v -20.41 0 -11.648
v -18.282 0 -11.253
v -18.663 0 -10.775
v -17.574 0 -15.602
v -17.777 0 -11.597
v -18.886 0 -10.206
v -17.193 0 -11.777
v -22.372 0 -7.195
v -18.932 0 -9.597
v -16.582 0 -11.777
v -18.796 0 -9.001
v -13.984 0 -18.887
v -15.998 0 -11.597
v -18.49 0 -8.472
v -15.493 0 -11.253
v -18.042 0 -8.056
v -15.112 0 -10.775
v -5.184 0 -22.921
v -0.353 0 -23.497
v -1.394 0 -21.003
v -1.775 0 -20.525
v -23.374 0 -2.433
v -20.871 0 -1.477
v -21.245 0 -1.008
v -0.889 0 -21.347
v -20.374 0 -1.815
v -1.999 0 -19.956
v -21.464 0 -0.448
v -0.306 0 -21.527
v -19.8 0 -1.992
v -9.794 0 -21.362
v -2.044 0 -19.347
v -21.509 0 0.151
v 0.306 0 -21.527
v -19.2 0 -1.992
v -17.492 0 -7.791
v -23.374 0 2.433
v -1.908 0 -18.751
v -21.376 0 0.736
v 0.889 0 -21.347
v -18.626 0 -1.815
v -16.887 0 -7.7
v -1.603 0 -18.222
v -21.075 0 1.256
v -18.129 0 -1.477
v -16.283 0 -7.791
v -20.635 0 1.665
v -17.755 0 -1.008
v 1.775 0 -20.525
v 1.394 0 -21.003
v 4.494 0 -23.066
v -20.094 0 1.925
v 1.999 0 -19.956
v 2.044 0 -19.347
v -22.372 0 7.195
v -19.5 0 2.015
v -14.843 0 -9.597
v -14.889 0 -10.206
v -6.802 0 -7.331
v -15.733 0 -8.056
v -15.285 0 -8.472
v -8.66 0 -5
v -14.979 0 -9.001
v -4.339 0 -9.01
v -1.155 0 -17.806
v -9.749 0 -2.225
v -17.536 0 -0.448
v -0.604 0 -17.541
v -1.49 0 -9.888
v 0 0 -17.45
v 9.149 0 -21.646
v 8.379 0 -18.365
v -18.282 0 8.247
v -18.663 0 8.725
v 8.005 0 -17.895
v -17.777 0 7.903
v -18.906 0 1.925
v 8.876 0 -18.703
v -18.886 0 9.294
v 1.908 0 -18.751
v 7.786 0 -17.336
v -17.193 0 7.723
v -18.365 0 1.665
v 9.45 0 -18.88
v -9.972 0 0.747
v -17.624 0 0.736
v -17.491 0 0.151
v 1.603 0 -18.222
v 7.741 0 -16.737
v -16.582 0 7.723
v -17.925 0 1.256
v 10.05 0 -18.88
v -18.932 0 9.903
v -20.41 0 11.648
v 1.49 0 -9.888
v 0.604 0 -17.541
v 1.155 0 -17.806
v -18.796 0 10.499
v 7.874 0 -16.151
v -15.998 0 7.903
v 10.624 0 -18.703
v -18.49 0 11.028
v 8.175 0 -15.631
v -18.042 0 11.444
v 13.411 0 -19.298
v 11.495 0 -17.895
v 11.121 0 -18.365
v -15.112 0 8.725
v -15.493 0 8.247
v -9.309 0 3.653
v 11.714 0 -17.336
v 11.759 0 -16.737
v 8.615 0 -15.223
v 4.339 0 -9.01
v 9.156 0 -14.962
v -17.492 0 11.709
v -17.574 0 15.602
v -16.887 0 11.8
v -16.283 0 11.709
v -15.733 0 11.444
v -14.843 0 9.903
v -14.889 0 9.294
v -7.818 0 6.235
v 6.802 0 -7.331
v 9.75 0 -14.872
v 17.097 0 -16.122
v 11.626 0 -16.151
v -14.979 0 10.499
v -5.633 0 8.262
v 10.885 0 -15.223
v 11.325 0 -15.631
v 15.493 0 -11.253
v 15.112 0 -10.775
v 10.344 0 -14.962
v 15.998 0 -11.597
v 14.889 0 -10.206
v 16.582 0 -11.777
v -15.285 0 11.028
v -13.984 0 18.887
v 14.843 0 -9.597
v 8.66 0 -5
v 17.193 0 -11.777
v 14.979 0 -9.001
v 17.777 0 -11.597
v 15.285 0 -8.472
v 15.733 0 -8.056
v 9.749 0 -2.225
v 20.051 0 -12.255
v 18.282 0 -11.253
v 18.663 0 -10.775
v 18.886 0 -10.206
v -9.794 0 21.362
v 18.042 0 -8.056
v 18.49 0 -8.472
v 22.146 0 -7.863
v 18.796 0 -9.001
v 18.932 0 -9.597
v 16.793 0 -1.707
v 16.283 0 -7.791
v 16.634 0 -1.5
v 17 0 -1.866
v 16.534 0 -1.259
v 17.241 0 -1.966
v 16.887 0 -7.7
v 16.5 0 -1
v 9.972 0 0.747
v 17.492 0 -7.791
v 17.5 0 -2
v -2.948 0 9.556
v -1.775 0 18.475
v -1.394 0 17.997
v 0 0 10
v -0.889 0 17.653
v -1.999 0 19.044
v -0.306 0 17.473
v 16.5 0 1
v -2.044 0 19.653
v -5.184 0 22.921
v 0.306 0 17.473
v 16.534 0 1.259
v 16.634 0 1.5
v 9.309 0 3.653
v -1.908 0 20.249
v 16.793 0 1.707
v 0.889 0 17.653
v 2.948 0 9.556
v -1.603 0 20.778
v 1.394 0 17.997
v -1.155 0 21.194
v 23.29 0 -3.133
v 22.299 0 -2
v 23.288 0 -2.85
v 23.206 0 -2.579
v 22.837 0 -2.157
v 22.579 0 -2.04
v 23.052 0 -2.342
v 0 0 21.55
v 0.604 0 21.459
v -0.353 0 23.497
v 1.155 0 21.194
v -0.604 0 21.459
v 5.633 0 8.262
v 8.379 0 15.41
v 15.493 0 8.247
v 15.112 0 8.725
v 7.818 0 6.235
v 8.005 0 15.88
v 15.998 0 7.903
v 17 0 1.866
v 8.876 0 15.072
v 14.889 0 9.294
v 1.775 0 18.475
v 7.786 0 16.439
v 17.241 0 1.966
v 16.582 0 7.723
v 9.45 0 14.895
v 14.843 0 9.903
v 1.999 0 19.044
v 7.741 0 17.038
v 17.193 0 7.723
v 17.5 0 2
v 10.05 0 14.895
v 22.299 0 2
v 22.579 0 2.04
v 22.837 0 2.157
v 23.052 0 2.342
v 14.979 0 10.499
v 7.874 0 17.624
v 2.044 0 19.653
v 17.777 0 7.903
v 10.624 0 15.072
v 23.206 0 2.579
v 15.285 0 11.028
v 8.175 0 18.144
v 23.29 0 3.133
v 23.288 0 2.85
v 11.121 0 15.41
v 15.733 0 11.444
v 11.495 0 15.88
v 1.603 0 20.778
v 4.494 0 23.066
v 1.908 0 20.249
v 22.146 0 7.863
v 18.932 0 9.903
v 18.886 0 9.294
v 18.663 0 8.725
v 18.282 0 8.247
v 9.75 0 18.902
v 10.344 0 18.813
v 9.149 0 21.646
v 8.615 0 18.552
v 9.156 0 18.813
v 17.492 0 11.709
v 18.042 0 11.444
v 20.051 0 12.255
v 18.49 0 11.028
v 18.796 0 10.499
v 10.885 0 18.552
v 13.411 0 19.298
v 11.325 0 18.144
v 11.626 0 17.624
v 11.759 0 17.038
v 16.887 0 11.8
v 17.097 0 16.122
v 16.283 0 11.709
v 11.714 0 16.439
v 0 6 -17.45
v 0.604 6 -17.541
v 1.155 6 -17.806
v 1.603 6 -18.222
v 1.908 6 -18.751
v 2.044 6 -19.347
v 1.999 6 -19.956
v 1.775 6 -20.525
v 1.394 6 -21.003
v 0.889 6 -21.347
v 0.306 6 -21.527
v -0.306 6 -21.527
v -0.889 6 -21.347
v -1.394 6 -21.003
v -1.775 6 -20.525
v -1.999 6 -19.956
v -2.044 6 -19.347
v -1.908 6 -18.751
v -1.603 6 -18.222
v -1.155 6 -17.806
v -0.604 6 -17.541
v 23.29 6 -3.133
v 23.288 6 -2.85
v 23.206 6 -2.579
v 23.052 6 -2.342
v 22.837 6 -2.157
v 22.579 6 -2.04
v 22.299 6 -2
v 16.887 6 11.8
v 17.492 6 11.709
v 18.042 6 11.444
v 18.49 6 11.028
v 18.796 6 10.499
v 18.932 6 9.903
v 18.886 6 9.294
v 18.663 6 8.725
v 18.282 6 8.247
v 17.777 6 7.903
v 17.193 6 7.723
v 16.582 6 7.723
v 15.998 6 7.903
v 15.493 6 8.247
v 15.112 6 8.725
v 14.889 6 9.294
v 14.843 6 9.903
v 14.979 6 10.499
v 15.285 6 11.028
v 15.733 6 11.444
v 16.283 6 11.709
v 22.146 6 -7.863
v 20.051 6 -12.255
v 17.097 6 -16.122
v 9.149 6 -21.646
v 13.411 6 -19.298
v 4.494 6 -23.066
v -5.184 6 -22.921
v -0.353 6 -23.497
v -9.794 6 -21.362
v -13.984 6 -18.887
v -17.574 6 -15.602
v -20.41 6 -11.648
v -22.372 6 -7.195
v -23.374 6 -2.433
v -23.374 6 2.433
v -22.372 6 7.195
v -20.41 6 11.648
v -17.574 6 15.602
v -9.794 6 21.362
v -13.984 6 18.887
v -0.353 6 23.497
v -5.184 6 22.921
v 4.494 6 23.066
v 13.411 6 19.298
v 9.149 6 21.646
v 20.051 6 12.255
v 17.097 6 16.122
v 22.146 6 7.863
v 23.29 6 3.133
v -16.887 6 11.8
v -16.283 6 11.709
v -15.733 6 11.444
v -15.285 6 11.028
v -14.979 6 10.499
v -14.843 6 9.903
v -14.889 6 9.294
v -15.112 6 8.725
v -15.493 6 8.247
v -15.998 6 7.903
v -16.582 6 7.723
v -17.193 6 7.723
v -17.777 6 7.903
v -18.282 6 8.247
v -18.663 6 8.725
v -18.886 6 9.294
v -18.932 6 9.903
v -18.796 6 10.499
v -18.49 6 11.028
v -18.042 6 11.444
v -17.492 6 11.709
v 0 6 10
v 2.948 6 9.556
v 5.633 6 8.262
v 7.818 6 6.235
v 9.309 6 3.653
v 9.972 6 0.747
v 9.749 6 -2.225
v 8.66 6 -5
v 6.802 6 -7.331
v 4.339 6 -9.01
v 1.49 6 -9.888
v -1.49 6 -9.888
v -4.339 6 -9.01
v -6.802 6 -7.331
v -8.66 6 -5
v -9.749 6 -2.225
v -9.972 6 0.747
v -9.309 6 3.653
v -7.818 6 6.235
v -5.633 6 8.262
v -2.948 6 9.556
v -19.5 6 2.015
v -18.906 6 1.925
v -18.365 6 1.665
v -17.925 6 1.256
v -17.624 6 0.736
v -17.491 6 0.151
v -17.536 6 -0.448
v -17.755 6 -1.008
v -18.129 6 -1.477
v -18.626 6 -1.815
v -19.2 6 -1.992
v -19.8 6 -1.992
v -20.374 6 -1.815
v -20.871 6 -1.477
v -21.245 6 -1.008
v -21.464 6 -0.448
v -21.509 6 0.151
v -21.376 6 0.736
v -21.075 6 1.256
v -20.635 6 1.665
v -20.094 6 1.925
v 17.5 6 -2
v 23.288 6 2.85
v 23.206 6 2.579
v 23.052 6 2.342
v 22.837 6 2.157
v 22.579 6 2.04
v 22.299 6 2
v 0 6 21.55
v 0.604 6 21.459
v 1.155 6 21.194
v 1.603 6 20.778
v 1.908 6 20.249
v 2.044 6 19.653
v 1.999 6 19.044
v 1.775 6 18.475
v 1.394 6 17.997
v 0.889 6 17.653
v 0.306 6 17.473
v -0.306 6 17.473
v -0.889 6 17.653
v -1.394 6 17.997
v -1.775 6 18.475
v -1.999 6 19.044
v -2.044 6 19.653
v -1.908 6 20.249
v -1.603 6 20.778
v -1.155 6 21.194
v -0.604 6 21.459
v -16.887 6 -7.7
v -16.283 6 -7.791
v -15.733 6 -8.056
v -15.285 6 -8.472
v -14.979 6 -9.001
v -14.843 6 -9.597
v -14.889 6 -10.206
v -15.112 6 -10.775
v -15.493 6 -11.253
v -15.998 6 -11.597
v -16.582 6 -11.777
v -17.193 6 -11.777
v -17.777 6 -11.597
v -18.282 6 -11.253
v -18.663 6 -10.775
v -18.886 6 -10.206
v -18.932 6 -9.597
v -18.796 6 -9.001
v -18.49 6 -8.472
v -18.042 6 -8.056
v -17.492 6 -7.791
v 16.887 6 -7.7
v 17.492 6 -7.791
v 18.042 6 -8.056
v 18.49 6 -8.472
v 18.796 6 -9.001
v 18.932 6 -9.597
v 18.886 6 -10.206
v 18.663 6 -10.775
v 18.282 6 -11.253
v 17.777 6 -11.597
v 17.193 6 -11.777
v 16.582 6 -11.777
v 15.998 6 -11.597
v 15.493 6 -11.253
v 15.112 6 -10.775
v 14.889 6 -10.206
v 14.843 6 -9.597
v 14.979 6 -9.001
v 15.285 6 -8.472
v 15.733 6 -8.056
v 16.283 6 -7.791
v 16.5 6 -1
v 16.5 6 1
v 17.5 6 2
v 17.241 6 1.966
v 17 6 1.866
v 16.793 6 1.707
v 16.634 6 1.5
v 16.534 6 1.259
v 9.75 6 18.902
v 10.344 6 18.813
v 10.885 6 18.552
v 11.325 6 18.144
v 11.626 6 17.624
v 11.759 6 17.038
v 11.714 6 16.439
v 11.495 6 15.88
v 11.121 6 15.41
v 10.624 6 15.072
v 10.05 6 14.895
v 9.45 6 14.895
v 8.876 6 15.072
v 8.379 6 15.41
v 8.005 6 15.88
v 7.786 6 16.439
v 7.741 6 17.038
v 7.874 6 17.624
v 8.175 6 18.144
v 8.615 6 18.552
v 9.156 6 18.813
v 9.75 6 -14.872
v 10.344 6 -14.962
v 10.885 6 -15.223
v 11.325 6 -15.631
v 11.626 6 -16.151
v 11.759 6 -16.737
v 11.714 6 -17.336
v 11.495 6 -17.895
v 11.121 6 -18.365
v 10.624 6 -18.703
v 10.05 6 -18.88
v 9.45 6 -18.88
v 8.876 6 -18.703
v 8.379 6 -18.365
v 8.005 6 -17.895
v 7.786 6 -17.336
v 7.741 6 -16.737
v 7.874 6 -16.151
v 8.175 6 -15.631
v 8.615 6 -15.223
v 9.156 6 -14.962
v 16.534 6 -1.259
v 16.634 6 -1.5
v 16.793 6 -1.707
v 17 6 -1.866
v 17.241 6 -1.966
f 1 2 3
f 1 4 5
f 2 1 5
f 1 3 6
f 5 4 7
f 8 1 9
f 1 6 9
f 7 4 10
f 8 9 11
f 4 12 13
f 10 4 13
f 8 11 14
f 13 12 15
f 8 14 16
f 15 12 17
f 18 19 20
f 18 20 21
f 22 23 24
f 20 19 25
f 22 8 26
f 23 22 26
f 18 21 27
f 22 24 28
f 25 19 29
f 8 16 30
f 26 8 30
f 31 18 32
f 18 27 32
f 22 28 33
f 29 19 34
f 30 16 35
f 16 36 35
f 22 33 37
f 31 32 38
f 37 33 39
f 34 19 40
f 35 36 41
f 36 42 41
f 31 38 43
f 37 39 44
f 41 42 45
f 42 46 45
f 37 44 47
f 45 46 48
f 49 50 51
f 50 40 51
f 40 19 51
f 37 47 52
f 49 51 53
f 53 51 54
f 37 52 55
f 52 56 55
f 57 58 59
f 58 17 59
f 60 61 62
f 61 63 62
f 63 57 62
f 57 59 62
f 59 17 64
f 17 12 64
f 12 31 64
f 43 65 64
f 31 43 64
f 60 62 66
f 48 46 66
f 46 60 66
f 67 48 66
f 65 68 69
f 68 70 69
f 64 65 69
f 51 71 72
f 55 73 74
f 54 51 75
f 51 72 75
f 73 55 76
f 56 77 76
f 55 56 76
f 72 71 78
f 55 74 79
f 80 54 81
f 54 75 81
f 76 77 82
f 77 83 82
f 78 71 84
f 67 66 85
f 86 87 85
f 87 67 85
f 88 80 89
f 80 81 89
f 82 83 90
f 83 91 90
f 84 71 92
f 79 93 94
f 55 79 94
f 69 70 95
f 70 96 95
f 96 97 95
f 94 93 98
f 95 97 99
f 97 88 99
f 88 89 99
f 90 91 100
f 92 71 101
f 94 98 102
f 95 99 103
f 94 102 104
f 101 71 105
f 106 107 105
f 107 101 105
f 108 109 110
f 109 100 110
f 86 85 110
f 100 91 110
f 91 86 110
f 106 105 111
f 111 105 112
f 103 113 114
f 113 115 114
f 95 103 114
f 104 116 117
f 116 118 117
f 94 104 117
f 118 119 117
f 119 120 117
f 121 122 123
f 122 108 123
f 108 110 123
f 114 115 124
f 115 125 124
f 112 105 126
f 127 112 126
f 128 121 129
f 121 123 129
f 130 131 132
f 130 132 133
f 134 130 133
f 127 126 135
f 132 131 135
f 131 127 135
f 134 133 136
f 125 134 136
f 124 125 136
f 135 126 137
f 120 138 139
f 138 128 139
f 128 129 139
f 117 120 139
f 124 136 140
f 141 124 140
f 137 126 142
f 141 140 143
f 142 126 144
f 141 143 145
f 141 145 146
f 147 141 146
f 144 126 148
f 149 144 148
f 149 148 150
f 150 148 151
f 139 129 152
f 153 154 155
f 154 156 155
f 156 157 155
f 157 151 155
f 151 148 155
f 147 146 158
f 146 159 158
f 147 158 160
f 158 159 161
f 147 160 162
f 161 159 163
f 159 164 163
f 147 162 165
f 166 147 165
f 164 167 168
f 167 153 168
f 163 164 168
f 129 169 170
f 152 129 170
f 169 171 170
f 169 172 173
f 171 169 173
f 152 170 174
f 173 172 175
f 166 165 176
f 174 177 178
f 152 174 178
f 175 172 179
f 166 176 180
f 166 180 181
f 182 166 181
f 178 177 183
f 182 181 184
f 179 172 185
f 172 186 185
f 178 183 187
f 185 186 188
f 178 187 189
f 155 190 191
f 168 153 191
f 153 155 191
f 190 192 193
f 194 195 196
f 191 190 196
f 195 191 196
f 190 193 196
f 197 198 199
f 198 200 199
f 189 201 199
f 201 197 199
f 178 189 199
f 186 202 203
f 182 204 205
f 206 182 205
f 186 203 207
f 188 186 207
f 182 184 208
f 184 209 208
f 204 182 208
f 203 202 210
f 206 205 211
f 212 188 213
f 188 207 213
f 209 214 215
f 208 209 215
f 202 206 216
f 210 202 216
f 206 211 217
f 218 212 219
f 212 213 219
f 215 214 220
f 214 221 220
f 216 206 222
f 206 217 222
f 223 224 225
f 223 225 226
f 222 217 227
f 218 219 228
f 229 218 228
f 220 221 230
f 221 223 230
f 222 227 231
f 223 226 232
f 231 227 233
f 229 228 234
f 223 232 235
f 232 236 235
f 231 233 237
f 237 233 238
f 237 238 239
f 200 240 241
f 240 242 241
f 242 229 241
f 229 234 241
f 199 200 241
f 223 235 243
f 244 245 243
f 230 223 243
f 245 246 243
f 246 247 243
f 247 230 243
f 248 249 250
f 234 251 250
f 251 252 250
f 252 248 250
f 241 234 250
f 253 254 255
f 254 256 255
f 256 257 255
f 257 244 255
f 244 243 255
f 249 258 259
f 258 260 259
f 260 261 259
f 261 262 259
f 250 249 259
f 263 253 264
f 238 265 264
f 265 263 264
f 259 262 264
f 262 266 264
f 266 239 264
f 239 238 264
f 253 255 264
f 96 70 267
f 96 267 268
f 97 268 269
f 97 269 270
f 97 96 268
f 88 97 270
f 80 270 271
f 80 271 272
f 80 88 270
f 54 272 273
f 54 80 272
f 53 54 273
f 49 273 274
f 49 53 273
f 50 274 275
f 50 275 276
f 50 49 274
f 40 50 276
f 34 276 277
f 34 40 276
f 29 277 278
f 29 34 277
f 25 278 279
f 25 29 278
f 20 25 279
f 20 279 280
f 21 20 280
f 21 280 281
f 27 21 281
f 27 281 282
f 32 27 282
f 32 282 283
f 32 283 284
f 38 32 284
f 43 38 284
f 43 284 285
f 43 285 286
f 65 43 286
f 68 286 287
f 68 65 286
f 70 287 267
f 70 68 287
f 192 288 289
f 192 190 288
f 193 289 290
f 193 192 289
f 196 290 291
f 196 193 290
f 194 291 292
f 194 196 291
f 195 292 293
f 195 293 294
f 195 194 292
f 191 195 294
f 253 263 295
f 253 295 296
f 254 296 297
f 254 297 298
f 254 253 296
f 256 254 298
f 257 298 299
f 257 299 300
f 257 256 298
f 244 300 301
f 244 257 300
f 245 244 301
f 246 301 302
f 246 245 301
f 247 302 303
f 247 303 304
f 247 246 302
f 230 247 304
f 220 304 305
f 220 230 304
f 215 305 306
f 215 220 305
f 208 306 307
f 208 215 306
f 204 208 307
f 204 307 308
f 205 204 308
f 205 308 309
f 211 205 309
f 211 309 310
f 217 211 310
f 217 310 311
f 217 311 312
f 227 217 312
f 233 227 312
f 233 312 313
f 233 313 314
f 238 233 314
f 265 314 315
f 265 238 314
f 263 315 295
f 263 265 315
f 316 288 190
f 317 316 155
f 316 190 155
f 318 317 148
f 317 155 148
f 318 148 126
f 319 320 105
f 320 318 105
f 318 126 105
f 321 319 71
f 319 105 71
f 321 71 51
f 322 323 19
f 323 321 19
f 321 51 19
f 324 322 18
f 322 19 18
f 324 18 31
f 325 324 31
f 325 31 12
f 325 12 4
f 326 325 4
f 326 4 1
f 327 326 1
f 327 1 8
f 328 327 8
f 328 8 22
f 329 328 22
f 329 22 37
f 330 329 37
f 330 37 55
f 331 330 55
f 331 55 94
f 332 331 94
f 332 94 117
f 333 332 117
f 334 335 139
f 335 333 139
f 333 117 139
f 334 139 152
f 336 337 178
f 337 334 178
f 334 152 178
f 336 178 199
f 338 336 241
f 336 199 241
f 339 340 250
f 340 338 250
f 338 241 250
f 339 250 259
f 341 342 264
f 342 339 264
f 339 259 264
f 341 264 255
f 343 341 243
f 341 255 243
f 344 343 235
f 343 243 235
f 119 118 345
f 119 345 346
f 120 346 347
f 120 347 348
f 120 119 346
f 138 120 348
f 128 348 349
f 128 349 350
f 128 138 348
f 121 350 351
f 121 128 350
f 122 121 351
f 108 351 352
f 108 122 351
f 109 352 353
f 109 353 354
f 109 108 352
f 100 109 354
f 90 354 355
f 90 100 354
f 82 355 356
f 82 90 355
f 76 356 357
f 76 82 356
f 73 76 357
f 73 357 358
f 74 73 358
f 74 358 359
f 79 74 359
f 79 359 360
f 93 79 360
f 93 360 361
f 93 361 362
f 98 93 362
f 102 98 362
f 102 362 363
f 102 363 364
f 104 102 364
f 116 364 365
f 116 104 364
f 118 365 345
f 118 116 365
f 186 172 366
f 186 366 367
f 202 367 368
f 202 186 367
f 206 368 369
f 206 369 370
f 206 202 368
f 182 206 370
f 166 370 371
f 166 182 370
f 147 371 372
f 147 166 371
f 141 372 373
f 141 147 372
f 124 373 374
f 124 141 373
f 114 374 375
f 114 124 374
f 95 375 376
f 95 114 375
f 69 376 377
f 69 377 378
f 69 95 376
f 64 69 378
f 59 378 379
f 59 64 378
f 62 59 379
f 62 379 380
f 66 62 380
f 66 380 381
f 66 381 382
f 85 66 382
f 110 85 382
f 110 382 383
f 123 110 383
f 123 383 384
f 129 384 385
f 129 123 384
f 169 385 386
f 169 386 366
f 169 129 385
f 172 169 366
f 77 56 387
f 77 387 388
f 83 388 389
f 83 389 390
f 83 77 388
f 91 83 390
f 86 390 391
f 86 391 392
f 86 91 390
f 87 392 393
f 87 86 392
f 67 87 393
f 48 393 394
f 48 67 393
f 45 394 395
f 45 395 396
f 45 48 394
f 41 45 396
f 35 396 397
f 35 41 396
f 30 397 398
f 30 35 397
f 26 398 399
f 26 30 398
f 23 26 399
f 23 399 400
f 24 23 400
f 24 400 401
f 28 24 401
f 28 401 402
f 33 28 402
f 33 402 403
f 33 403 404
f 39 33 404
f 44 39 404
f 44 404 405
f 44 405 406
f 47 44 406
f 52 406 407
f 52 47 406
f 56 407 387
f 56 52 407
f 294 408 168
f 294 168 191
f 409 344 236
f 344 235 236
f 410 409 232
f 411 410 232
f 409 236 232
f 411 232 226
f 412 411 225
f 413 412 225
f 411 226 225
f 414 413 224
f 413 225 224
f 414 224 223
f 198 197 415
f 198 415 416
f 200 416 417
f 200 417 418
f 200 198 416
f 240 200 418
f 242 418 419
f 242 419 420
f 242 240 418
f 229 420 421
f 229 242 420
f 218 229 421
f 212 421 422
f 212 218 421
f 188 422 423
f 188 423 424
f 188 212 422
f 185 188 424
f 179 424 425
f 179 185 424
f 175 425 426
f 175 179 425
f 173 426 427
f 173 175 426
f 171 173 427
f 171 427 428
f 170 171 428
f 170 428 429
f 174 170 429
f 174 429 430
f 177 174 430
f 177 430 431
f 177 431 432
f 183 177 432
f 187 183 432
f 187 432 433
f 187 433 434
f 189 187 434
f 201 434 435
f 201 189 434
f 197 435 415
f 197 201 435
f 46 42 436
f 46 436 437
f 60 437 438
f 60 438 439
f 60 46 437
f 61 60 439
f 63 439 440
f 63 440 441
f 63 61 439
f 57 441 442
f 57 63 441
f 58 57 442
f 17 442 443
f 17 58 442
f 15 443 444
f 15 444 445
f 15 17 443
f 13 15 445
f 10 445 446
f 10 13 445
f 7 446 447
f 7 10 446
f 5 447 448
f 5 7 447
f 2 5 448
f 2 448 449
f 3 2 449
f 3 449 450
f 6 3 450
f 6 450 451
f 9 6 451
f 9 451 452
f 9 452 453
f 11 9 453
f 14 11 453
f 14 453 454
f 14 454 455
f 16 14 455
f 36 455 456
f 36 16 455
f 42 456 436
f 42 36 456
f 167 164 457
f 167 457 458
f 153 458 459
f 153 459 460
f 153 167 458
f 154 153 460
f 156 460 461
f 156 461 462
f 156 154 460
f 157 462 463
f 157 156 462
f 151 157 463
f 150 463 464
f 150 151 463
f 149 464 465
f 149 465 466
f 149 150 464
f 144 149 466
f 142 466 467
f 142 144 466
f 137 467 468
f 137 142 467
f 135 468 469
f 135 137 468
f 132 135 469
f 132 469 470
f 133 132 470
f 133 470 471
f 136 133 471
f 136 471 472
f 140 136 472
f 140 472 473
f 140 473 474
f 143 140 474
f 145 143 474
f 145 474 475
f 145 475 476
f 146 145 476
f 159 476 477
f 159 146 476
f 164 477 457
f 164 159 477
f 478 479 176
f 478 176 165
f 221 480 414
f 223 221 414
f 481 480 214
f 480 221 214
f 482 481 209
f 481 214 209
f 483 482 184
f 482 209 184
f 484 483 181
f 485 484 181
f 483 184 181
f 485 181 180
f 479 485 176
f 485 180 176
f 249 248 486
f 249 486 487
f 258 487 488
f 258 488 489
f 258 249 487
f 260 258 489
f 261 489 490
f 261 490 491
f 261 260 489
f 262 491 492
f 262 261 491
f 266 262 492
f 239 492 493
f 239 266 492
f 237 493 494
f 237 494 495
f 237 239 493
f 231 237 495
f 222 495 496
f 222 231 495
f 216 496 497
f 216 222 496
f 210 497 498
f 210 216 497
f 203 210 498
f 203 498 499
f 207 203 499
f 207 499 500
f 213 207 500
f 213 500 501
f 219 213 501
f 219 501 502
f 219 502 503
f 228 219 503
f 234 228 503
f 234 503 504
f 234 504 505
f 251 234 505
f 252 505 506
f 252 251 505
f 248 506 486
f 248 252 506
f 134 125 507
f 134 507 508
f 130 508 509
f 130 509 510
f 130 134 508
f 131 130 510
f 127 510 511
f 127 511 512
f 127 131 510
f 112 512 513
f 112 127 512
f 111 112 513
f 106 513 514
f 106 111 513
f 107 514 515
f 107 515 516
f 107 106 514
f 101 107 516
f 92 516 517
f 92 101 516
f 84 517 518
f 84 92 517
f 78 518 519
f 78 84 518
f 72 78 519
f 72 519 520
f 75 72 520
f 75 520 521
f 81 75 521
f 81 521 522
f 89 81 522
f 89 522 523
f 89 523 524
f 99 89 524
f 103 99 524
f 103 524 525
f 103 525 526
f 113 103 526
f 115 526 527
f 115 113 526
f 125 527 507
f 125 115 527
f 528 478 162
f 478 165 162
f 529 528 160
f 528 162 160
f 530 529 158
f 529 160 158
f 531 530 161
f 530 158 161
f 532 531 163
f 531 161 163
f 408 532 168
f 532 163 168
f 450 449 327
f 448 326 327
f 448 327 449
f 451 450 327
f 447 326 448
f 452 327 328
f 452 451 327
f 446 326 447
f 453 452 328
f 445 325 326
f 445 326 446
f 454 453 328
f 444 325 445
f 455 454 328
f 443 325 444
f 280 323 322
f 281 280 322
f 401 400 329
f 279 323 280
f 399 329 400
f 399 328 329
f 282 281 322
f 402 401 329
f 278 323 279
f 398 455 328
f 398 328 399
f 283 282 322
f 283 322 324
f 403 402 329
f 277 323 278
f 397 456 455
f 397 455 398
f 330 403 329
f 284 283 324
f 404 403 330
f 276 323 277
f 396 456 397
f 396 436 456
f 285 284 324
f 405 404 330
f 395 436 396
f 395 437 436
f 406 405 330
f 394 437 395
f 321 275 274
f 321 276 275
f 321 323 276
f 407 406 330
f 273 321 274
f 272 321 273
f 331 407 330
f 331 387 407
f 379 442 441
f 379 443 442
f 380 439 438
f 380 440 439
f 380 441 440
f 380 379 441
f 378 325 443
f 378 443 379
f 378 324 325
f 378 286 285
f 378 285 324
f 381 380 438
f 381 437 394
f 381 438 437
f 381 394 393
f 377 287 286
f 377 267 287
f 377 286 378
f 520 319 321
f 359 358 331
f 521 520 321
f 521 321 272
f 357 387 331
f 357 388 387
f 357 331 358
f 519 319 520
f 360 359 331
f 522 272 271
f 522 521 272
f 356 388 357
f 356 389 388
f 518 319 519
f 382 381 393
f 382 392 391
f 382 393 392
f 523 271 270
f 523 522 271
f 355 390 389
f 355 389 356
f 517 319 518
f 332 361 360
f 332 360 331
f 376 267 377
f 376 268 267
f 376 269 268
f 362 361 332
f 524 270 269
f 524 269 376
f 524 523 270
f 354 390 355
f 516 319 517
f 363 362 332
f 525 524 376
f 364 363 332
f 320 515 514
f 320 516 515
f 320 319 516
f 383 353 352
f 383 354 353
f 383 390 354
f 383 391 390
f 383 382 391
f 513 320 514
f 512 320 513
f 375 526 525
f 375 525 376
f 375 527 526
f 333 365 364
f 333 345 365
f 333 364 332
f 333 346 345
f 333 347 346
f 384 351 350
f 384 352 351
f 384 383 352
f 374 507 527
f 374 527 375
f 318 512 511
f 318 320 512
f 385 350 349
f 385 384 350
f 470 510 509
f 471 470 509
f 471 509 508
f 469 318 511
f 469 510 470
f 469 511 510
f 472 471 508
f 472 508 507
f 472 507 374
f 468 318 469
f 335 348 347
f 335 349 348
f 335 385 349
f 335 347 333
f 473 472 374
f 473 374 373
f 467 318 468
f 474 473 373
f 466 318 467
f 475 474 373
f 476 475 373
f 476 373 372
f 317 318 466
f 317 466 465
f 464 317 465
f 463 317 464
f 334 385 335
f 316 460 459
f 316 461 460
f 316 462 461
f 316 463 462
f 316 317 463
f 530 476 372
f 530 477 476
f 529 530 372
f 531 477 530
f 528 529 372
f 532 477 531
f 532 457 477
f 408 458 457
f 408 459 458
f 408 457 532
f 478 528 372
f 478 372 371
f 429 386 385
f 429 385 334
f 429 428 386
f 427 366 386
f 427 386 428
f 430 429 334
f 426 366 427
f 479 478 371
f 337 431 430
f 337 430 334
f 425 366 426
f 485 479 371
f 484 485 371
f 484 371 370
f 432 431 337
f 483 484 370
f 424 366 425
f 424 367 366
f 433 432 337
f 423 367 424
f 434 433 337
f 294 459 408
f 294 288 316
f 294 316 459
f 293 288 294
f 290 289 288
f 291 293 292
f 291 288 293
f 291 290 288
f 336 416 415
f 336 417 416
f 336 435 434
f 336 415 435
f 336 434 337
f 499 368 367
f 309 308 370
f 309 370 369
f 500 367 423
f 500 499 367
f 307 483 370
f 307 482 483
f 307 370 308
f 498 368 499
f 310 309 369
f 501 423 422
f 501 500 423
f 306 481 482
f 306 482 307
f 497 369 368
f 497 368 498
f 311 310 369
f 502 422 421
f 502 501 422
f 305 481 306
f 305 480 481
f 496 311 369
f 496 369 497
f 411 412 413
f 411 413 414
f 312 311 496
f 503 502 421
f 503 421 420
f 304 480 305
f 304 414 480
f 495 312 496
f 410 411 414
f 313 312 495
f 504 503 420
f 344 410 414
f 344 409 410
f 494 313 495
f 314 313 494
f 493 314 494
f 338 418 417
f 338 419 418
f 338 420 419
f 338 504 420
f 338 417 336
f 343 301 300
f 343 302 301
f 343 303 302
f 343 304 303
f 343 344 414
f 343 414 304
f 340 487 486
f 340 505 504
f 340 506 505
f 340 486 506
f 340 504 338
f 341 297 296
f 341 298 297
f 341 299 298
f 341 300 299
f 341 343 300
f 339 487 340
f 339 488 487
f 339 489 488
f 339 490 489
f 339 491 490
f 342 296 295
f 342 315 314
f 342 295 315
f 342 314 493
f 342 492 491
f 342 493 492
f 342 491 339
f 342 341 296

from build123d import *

# Parameters (mm, degrees)
SKETCH_1_R          = 23.5
SKETCH_1_R_2        = 10
SKETCH_1_R_3        = 2.05
SKETCH_1_R_4        = 2.015
EXTRUDE_1_DEPTH     = 6
SKETCH_2_W          = 12.240085516
SKETCH_2_H          = 4
CUT_EXTRUDE_1_DEPTH = 10
FILLET_1_R          = 1


with BuildPart() as part:
    # 草图1 → 凸台-拉伸1 (new body)
    with BuildSketch(Plane(origin=(0, 0, 0), x_dir=(1, 0, 0), z_dir=(0, 1, 0))):
        with Locations(Location((0, 0, 0), (0, 0, 270))):
            Circle(SKETCH_1_R)
        with Locations(Location((0, 0, 0), (0, 0, 270))):
            Circle(SKETCH_1_R_2, mode=Mode.SUBTRACT)
        with Locations(Location((0, 19.5, 0), (0, 0, 270))):
            Circle(SKETCH_1_R_3, mode=Mode.SUBTRACT)
        with Locations(Location((16.887495374, 9.75, 0), (0, 0, 270))):
            Circle(SKETCH_1_R_3, mode=Mode.SUBTRACT)
        with Locations(Location((16.887495374, -9.75, 0), (0, 0, 270))):
            Circle(SKETCH_1_R_3, mode=Mode.SUBTRACT)
        with Locations(Location((0, -19.5, 0), (0, 0, 270))):
            Circle(SKETCH_1_R_3, mode=Mode.SUBTRACT)
        with Locations(Location((-16.887495374, -9.75, 0), (0, 0, 270))):
            Circle(SKETCH_1_R_3, mode=Mode.SUBTRACT)
        with Locations(Location((-16.887495374, 9.75, 0), (0, 0, 270))):
            Circle(SKETCH_1_R_3, mode=Mode.SUBTRACT)
        with Locations(Location((-19.5, 0, 0), (0, 0, 270))):
            Circle(SKETCH_1_R_4, mode=Mode.SUBTRACT)
        with Locations(Location((9.75, 16.887495374, 0), (0, 0, 270))):
            Circle(SKETCH_1_R_4, mode=Mode.SUBTRACT)
        with Locations(Location((9.75, -16.887495374, 0), (0, 0, 270))):
            Circle(SKETCH_1_R_4, mode=Mode.SUBTRACT)
    extrude(amount=EXTRUDE_1_DEPTH)

    # 草图2 → 切除-拉伸1 (cut)
    with BuildSketch(Plane(origin=(0, 6, 0), x_dir=(1, 0, 0), z_dir=(0, 1, 0))):
        with Locations((22.620042758, 0)):
            Rectangle(SKETCH_2_W, SKETCH_2_H)
    extrude(amount=-CUT_EXTRUDE_1_DEPTH, mode=Mode.SUBTRACT)

    # 圆角1
    fillet_1_edges = [part.edges().sort_by_distance(p)[0] for p in [
        (23.414738948, 3, 2),
        (23.414738948, 3, -2),
        (16.5, 3, 2),
        (16.5, 3, -2),
    ]]
    fillet(fillet_1_edges, radius=FILLET_1_R)


solid = part.part
